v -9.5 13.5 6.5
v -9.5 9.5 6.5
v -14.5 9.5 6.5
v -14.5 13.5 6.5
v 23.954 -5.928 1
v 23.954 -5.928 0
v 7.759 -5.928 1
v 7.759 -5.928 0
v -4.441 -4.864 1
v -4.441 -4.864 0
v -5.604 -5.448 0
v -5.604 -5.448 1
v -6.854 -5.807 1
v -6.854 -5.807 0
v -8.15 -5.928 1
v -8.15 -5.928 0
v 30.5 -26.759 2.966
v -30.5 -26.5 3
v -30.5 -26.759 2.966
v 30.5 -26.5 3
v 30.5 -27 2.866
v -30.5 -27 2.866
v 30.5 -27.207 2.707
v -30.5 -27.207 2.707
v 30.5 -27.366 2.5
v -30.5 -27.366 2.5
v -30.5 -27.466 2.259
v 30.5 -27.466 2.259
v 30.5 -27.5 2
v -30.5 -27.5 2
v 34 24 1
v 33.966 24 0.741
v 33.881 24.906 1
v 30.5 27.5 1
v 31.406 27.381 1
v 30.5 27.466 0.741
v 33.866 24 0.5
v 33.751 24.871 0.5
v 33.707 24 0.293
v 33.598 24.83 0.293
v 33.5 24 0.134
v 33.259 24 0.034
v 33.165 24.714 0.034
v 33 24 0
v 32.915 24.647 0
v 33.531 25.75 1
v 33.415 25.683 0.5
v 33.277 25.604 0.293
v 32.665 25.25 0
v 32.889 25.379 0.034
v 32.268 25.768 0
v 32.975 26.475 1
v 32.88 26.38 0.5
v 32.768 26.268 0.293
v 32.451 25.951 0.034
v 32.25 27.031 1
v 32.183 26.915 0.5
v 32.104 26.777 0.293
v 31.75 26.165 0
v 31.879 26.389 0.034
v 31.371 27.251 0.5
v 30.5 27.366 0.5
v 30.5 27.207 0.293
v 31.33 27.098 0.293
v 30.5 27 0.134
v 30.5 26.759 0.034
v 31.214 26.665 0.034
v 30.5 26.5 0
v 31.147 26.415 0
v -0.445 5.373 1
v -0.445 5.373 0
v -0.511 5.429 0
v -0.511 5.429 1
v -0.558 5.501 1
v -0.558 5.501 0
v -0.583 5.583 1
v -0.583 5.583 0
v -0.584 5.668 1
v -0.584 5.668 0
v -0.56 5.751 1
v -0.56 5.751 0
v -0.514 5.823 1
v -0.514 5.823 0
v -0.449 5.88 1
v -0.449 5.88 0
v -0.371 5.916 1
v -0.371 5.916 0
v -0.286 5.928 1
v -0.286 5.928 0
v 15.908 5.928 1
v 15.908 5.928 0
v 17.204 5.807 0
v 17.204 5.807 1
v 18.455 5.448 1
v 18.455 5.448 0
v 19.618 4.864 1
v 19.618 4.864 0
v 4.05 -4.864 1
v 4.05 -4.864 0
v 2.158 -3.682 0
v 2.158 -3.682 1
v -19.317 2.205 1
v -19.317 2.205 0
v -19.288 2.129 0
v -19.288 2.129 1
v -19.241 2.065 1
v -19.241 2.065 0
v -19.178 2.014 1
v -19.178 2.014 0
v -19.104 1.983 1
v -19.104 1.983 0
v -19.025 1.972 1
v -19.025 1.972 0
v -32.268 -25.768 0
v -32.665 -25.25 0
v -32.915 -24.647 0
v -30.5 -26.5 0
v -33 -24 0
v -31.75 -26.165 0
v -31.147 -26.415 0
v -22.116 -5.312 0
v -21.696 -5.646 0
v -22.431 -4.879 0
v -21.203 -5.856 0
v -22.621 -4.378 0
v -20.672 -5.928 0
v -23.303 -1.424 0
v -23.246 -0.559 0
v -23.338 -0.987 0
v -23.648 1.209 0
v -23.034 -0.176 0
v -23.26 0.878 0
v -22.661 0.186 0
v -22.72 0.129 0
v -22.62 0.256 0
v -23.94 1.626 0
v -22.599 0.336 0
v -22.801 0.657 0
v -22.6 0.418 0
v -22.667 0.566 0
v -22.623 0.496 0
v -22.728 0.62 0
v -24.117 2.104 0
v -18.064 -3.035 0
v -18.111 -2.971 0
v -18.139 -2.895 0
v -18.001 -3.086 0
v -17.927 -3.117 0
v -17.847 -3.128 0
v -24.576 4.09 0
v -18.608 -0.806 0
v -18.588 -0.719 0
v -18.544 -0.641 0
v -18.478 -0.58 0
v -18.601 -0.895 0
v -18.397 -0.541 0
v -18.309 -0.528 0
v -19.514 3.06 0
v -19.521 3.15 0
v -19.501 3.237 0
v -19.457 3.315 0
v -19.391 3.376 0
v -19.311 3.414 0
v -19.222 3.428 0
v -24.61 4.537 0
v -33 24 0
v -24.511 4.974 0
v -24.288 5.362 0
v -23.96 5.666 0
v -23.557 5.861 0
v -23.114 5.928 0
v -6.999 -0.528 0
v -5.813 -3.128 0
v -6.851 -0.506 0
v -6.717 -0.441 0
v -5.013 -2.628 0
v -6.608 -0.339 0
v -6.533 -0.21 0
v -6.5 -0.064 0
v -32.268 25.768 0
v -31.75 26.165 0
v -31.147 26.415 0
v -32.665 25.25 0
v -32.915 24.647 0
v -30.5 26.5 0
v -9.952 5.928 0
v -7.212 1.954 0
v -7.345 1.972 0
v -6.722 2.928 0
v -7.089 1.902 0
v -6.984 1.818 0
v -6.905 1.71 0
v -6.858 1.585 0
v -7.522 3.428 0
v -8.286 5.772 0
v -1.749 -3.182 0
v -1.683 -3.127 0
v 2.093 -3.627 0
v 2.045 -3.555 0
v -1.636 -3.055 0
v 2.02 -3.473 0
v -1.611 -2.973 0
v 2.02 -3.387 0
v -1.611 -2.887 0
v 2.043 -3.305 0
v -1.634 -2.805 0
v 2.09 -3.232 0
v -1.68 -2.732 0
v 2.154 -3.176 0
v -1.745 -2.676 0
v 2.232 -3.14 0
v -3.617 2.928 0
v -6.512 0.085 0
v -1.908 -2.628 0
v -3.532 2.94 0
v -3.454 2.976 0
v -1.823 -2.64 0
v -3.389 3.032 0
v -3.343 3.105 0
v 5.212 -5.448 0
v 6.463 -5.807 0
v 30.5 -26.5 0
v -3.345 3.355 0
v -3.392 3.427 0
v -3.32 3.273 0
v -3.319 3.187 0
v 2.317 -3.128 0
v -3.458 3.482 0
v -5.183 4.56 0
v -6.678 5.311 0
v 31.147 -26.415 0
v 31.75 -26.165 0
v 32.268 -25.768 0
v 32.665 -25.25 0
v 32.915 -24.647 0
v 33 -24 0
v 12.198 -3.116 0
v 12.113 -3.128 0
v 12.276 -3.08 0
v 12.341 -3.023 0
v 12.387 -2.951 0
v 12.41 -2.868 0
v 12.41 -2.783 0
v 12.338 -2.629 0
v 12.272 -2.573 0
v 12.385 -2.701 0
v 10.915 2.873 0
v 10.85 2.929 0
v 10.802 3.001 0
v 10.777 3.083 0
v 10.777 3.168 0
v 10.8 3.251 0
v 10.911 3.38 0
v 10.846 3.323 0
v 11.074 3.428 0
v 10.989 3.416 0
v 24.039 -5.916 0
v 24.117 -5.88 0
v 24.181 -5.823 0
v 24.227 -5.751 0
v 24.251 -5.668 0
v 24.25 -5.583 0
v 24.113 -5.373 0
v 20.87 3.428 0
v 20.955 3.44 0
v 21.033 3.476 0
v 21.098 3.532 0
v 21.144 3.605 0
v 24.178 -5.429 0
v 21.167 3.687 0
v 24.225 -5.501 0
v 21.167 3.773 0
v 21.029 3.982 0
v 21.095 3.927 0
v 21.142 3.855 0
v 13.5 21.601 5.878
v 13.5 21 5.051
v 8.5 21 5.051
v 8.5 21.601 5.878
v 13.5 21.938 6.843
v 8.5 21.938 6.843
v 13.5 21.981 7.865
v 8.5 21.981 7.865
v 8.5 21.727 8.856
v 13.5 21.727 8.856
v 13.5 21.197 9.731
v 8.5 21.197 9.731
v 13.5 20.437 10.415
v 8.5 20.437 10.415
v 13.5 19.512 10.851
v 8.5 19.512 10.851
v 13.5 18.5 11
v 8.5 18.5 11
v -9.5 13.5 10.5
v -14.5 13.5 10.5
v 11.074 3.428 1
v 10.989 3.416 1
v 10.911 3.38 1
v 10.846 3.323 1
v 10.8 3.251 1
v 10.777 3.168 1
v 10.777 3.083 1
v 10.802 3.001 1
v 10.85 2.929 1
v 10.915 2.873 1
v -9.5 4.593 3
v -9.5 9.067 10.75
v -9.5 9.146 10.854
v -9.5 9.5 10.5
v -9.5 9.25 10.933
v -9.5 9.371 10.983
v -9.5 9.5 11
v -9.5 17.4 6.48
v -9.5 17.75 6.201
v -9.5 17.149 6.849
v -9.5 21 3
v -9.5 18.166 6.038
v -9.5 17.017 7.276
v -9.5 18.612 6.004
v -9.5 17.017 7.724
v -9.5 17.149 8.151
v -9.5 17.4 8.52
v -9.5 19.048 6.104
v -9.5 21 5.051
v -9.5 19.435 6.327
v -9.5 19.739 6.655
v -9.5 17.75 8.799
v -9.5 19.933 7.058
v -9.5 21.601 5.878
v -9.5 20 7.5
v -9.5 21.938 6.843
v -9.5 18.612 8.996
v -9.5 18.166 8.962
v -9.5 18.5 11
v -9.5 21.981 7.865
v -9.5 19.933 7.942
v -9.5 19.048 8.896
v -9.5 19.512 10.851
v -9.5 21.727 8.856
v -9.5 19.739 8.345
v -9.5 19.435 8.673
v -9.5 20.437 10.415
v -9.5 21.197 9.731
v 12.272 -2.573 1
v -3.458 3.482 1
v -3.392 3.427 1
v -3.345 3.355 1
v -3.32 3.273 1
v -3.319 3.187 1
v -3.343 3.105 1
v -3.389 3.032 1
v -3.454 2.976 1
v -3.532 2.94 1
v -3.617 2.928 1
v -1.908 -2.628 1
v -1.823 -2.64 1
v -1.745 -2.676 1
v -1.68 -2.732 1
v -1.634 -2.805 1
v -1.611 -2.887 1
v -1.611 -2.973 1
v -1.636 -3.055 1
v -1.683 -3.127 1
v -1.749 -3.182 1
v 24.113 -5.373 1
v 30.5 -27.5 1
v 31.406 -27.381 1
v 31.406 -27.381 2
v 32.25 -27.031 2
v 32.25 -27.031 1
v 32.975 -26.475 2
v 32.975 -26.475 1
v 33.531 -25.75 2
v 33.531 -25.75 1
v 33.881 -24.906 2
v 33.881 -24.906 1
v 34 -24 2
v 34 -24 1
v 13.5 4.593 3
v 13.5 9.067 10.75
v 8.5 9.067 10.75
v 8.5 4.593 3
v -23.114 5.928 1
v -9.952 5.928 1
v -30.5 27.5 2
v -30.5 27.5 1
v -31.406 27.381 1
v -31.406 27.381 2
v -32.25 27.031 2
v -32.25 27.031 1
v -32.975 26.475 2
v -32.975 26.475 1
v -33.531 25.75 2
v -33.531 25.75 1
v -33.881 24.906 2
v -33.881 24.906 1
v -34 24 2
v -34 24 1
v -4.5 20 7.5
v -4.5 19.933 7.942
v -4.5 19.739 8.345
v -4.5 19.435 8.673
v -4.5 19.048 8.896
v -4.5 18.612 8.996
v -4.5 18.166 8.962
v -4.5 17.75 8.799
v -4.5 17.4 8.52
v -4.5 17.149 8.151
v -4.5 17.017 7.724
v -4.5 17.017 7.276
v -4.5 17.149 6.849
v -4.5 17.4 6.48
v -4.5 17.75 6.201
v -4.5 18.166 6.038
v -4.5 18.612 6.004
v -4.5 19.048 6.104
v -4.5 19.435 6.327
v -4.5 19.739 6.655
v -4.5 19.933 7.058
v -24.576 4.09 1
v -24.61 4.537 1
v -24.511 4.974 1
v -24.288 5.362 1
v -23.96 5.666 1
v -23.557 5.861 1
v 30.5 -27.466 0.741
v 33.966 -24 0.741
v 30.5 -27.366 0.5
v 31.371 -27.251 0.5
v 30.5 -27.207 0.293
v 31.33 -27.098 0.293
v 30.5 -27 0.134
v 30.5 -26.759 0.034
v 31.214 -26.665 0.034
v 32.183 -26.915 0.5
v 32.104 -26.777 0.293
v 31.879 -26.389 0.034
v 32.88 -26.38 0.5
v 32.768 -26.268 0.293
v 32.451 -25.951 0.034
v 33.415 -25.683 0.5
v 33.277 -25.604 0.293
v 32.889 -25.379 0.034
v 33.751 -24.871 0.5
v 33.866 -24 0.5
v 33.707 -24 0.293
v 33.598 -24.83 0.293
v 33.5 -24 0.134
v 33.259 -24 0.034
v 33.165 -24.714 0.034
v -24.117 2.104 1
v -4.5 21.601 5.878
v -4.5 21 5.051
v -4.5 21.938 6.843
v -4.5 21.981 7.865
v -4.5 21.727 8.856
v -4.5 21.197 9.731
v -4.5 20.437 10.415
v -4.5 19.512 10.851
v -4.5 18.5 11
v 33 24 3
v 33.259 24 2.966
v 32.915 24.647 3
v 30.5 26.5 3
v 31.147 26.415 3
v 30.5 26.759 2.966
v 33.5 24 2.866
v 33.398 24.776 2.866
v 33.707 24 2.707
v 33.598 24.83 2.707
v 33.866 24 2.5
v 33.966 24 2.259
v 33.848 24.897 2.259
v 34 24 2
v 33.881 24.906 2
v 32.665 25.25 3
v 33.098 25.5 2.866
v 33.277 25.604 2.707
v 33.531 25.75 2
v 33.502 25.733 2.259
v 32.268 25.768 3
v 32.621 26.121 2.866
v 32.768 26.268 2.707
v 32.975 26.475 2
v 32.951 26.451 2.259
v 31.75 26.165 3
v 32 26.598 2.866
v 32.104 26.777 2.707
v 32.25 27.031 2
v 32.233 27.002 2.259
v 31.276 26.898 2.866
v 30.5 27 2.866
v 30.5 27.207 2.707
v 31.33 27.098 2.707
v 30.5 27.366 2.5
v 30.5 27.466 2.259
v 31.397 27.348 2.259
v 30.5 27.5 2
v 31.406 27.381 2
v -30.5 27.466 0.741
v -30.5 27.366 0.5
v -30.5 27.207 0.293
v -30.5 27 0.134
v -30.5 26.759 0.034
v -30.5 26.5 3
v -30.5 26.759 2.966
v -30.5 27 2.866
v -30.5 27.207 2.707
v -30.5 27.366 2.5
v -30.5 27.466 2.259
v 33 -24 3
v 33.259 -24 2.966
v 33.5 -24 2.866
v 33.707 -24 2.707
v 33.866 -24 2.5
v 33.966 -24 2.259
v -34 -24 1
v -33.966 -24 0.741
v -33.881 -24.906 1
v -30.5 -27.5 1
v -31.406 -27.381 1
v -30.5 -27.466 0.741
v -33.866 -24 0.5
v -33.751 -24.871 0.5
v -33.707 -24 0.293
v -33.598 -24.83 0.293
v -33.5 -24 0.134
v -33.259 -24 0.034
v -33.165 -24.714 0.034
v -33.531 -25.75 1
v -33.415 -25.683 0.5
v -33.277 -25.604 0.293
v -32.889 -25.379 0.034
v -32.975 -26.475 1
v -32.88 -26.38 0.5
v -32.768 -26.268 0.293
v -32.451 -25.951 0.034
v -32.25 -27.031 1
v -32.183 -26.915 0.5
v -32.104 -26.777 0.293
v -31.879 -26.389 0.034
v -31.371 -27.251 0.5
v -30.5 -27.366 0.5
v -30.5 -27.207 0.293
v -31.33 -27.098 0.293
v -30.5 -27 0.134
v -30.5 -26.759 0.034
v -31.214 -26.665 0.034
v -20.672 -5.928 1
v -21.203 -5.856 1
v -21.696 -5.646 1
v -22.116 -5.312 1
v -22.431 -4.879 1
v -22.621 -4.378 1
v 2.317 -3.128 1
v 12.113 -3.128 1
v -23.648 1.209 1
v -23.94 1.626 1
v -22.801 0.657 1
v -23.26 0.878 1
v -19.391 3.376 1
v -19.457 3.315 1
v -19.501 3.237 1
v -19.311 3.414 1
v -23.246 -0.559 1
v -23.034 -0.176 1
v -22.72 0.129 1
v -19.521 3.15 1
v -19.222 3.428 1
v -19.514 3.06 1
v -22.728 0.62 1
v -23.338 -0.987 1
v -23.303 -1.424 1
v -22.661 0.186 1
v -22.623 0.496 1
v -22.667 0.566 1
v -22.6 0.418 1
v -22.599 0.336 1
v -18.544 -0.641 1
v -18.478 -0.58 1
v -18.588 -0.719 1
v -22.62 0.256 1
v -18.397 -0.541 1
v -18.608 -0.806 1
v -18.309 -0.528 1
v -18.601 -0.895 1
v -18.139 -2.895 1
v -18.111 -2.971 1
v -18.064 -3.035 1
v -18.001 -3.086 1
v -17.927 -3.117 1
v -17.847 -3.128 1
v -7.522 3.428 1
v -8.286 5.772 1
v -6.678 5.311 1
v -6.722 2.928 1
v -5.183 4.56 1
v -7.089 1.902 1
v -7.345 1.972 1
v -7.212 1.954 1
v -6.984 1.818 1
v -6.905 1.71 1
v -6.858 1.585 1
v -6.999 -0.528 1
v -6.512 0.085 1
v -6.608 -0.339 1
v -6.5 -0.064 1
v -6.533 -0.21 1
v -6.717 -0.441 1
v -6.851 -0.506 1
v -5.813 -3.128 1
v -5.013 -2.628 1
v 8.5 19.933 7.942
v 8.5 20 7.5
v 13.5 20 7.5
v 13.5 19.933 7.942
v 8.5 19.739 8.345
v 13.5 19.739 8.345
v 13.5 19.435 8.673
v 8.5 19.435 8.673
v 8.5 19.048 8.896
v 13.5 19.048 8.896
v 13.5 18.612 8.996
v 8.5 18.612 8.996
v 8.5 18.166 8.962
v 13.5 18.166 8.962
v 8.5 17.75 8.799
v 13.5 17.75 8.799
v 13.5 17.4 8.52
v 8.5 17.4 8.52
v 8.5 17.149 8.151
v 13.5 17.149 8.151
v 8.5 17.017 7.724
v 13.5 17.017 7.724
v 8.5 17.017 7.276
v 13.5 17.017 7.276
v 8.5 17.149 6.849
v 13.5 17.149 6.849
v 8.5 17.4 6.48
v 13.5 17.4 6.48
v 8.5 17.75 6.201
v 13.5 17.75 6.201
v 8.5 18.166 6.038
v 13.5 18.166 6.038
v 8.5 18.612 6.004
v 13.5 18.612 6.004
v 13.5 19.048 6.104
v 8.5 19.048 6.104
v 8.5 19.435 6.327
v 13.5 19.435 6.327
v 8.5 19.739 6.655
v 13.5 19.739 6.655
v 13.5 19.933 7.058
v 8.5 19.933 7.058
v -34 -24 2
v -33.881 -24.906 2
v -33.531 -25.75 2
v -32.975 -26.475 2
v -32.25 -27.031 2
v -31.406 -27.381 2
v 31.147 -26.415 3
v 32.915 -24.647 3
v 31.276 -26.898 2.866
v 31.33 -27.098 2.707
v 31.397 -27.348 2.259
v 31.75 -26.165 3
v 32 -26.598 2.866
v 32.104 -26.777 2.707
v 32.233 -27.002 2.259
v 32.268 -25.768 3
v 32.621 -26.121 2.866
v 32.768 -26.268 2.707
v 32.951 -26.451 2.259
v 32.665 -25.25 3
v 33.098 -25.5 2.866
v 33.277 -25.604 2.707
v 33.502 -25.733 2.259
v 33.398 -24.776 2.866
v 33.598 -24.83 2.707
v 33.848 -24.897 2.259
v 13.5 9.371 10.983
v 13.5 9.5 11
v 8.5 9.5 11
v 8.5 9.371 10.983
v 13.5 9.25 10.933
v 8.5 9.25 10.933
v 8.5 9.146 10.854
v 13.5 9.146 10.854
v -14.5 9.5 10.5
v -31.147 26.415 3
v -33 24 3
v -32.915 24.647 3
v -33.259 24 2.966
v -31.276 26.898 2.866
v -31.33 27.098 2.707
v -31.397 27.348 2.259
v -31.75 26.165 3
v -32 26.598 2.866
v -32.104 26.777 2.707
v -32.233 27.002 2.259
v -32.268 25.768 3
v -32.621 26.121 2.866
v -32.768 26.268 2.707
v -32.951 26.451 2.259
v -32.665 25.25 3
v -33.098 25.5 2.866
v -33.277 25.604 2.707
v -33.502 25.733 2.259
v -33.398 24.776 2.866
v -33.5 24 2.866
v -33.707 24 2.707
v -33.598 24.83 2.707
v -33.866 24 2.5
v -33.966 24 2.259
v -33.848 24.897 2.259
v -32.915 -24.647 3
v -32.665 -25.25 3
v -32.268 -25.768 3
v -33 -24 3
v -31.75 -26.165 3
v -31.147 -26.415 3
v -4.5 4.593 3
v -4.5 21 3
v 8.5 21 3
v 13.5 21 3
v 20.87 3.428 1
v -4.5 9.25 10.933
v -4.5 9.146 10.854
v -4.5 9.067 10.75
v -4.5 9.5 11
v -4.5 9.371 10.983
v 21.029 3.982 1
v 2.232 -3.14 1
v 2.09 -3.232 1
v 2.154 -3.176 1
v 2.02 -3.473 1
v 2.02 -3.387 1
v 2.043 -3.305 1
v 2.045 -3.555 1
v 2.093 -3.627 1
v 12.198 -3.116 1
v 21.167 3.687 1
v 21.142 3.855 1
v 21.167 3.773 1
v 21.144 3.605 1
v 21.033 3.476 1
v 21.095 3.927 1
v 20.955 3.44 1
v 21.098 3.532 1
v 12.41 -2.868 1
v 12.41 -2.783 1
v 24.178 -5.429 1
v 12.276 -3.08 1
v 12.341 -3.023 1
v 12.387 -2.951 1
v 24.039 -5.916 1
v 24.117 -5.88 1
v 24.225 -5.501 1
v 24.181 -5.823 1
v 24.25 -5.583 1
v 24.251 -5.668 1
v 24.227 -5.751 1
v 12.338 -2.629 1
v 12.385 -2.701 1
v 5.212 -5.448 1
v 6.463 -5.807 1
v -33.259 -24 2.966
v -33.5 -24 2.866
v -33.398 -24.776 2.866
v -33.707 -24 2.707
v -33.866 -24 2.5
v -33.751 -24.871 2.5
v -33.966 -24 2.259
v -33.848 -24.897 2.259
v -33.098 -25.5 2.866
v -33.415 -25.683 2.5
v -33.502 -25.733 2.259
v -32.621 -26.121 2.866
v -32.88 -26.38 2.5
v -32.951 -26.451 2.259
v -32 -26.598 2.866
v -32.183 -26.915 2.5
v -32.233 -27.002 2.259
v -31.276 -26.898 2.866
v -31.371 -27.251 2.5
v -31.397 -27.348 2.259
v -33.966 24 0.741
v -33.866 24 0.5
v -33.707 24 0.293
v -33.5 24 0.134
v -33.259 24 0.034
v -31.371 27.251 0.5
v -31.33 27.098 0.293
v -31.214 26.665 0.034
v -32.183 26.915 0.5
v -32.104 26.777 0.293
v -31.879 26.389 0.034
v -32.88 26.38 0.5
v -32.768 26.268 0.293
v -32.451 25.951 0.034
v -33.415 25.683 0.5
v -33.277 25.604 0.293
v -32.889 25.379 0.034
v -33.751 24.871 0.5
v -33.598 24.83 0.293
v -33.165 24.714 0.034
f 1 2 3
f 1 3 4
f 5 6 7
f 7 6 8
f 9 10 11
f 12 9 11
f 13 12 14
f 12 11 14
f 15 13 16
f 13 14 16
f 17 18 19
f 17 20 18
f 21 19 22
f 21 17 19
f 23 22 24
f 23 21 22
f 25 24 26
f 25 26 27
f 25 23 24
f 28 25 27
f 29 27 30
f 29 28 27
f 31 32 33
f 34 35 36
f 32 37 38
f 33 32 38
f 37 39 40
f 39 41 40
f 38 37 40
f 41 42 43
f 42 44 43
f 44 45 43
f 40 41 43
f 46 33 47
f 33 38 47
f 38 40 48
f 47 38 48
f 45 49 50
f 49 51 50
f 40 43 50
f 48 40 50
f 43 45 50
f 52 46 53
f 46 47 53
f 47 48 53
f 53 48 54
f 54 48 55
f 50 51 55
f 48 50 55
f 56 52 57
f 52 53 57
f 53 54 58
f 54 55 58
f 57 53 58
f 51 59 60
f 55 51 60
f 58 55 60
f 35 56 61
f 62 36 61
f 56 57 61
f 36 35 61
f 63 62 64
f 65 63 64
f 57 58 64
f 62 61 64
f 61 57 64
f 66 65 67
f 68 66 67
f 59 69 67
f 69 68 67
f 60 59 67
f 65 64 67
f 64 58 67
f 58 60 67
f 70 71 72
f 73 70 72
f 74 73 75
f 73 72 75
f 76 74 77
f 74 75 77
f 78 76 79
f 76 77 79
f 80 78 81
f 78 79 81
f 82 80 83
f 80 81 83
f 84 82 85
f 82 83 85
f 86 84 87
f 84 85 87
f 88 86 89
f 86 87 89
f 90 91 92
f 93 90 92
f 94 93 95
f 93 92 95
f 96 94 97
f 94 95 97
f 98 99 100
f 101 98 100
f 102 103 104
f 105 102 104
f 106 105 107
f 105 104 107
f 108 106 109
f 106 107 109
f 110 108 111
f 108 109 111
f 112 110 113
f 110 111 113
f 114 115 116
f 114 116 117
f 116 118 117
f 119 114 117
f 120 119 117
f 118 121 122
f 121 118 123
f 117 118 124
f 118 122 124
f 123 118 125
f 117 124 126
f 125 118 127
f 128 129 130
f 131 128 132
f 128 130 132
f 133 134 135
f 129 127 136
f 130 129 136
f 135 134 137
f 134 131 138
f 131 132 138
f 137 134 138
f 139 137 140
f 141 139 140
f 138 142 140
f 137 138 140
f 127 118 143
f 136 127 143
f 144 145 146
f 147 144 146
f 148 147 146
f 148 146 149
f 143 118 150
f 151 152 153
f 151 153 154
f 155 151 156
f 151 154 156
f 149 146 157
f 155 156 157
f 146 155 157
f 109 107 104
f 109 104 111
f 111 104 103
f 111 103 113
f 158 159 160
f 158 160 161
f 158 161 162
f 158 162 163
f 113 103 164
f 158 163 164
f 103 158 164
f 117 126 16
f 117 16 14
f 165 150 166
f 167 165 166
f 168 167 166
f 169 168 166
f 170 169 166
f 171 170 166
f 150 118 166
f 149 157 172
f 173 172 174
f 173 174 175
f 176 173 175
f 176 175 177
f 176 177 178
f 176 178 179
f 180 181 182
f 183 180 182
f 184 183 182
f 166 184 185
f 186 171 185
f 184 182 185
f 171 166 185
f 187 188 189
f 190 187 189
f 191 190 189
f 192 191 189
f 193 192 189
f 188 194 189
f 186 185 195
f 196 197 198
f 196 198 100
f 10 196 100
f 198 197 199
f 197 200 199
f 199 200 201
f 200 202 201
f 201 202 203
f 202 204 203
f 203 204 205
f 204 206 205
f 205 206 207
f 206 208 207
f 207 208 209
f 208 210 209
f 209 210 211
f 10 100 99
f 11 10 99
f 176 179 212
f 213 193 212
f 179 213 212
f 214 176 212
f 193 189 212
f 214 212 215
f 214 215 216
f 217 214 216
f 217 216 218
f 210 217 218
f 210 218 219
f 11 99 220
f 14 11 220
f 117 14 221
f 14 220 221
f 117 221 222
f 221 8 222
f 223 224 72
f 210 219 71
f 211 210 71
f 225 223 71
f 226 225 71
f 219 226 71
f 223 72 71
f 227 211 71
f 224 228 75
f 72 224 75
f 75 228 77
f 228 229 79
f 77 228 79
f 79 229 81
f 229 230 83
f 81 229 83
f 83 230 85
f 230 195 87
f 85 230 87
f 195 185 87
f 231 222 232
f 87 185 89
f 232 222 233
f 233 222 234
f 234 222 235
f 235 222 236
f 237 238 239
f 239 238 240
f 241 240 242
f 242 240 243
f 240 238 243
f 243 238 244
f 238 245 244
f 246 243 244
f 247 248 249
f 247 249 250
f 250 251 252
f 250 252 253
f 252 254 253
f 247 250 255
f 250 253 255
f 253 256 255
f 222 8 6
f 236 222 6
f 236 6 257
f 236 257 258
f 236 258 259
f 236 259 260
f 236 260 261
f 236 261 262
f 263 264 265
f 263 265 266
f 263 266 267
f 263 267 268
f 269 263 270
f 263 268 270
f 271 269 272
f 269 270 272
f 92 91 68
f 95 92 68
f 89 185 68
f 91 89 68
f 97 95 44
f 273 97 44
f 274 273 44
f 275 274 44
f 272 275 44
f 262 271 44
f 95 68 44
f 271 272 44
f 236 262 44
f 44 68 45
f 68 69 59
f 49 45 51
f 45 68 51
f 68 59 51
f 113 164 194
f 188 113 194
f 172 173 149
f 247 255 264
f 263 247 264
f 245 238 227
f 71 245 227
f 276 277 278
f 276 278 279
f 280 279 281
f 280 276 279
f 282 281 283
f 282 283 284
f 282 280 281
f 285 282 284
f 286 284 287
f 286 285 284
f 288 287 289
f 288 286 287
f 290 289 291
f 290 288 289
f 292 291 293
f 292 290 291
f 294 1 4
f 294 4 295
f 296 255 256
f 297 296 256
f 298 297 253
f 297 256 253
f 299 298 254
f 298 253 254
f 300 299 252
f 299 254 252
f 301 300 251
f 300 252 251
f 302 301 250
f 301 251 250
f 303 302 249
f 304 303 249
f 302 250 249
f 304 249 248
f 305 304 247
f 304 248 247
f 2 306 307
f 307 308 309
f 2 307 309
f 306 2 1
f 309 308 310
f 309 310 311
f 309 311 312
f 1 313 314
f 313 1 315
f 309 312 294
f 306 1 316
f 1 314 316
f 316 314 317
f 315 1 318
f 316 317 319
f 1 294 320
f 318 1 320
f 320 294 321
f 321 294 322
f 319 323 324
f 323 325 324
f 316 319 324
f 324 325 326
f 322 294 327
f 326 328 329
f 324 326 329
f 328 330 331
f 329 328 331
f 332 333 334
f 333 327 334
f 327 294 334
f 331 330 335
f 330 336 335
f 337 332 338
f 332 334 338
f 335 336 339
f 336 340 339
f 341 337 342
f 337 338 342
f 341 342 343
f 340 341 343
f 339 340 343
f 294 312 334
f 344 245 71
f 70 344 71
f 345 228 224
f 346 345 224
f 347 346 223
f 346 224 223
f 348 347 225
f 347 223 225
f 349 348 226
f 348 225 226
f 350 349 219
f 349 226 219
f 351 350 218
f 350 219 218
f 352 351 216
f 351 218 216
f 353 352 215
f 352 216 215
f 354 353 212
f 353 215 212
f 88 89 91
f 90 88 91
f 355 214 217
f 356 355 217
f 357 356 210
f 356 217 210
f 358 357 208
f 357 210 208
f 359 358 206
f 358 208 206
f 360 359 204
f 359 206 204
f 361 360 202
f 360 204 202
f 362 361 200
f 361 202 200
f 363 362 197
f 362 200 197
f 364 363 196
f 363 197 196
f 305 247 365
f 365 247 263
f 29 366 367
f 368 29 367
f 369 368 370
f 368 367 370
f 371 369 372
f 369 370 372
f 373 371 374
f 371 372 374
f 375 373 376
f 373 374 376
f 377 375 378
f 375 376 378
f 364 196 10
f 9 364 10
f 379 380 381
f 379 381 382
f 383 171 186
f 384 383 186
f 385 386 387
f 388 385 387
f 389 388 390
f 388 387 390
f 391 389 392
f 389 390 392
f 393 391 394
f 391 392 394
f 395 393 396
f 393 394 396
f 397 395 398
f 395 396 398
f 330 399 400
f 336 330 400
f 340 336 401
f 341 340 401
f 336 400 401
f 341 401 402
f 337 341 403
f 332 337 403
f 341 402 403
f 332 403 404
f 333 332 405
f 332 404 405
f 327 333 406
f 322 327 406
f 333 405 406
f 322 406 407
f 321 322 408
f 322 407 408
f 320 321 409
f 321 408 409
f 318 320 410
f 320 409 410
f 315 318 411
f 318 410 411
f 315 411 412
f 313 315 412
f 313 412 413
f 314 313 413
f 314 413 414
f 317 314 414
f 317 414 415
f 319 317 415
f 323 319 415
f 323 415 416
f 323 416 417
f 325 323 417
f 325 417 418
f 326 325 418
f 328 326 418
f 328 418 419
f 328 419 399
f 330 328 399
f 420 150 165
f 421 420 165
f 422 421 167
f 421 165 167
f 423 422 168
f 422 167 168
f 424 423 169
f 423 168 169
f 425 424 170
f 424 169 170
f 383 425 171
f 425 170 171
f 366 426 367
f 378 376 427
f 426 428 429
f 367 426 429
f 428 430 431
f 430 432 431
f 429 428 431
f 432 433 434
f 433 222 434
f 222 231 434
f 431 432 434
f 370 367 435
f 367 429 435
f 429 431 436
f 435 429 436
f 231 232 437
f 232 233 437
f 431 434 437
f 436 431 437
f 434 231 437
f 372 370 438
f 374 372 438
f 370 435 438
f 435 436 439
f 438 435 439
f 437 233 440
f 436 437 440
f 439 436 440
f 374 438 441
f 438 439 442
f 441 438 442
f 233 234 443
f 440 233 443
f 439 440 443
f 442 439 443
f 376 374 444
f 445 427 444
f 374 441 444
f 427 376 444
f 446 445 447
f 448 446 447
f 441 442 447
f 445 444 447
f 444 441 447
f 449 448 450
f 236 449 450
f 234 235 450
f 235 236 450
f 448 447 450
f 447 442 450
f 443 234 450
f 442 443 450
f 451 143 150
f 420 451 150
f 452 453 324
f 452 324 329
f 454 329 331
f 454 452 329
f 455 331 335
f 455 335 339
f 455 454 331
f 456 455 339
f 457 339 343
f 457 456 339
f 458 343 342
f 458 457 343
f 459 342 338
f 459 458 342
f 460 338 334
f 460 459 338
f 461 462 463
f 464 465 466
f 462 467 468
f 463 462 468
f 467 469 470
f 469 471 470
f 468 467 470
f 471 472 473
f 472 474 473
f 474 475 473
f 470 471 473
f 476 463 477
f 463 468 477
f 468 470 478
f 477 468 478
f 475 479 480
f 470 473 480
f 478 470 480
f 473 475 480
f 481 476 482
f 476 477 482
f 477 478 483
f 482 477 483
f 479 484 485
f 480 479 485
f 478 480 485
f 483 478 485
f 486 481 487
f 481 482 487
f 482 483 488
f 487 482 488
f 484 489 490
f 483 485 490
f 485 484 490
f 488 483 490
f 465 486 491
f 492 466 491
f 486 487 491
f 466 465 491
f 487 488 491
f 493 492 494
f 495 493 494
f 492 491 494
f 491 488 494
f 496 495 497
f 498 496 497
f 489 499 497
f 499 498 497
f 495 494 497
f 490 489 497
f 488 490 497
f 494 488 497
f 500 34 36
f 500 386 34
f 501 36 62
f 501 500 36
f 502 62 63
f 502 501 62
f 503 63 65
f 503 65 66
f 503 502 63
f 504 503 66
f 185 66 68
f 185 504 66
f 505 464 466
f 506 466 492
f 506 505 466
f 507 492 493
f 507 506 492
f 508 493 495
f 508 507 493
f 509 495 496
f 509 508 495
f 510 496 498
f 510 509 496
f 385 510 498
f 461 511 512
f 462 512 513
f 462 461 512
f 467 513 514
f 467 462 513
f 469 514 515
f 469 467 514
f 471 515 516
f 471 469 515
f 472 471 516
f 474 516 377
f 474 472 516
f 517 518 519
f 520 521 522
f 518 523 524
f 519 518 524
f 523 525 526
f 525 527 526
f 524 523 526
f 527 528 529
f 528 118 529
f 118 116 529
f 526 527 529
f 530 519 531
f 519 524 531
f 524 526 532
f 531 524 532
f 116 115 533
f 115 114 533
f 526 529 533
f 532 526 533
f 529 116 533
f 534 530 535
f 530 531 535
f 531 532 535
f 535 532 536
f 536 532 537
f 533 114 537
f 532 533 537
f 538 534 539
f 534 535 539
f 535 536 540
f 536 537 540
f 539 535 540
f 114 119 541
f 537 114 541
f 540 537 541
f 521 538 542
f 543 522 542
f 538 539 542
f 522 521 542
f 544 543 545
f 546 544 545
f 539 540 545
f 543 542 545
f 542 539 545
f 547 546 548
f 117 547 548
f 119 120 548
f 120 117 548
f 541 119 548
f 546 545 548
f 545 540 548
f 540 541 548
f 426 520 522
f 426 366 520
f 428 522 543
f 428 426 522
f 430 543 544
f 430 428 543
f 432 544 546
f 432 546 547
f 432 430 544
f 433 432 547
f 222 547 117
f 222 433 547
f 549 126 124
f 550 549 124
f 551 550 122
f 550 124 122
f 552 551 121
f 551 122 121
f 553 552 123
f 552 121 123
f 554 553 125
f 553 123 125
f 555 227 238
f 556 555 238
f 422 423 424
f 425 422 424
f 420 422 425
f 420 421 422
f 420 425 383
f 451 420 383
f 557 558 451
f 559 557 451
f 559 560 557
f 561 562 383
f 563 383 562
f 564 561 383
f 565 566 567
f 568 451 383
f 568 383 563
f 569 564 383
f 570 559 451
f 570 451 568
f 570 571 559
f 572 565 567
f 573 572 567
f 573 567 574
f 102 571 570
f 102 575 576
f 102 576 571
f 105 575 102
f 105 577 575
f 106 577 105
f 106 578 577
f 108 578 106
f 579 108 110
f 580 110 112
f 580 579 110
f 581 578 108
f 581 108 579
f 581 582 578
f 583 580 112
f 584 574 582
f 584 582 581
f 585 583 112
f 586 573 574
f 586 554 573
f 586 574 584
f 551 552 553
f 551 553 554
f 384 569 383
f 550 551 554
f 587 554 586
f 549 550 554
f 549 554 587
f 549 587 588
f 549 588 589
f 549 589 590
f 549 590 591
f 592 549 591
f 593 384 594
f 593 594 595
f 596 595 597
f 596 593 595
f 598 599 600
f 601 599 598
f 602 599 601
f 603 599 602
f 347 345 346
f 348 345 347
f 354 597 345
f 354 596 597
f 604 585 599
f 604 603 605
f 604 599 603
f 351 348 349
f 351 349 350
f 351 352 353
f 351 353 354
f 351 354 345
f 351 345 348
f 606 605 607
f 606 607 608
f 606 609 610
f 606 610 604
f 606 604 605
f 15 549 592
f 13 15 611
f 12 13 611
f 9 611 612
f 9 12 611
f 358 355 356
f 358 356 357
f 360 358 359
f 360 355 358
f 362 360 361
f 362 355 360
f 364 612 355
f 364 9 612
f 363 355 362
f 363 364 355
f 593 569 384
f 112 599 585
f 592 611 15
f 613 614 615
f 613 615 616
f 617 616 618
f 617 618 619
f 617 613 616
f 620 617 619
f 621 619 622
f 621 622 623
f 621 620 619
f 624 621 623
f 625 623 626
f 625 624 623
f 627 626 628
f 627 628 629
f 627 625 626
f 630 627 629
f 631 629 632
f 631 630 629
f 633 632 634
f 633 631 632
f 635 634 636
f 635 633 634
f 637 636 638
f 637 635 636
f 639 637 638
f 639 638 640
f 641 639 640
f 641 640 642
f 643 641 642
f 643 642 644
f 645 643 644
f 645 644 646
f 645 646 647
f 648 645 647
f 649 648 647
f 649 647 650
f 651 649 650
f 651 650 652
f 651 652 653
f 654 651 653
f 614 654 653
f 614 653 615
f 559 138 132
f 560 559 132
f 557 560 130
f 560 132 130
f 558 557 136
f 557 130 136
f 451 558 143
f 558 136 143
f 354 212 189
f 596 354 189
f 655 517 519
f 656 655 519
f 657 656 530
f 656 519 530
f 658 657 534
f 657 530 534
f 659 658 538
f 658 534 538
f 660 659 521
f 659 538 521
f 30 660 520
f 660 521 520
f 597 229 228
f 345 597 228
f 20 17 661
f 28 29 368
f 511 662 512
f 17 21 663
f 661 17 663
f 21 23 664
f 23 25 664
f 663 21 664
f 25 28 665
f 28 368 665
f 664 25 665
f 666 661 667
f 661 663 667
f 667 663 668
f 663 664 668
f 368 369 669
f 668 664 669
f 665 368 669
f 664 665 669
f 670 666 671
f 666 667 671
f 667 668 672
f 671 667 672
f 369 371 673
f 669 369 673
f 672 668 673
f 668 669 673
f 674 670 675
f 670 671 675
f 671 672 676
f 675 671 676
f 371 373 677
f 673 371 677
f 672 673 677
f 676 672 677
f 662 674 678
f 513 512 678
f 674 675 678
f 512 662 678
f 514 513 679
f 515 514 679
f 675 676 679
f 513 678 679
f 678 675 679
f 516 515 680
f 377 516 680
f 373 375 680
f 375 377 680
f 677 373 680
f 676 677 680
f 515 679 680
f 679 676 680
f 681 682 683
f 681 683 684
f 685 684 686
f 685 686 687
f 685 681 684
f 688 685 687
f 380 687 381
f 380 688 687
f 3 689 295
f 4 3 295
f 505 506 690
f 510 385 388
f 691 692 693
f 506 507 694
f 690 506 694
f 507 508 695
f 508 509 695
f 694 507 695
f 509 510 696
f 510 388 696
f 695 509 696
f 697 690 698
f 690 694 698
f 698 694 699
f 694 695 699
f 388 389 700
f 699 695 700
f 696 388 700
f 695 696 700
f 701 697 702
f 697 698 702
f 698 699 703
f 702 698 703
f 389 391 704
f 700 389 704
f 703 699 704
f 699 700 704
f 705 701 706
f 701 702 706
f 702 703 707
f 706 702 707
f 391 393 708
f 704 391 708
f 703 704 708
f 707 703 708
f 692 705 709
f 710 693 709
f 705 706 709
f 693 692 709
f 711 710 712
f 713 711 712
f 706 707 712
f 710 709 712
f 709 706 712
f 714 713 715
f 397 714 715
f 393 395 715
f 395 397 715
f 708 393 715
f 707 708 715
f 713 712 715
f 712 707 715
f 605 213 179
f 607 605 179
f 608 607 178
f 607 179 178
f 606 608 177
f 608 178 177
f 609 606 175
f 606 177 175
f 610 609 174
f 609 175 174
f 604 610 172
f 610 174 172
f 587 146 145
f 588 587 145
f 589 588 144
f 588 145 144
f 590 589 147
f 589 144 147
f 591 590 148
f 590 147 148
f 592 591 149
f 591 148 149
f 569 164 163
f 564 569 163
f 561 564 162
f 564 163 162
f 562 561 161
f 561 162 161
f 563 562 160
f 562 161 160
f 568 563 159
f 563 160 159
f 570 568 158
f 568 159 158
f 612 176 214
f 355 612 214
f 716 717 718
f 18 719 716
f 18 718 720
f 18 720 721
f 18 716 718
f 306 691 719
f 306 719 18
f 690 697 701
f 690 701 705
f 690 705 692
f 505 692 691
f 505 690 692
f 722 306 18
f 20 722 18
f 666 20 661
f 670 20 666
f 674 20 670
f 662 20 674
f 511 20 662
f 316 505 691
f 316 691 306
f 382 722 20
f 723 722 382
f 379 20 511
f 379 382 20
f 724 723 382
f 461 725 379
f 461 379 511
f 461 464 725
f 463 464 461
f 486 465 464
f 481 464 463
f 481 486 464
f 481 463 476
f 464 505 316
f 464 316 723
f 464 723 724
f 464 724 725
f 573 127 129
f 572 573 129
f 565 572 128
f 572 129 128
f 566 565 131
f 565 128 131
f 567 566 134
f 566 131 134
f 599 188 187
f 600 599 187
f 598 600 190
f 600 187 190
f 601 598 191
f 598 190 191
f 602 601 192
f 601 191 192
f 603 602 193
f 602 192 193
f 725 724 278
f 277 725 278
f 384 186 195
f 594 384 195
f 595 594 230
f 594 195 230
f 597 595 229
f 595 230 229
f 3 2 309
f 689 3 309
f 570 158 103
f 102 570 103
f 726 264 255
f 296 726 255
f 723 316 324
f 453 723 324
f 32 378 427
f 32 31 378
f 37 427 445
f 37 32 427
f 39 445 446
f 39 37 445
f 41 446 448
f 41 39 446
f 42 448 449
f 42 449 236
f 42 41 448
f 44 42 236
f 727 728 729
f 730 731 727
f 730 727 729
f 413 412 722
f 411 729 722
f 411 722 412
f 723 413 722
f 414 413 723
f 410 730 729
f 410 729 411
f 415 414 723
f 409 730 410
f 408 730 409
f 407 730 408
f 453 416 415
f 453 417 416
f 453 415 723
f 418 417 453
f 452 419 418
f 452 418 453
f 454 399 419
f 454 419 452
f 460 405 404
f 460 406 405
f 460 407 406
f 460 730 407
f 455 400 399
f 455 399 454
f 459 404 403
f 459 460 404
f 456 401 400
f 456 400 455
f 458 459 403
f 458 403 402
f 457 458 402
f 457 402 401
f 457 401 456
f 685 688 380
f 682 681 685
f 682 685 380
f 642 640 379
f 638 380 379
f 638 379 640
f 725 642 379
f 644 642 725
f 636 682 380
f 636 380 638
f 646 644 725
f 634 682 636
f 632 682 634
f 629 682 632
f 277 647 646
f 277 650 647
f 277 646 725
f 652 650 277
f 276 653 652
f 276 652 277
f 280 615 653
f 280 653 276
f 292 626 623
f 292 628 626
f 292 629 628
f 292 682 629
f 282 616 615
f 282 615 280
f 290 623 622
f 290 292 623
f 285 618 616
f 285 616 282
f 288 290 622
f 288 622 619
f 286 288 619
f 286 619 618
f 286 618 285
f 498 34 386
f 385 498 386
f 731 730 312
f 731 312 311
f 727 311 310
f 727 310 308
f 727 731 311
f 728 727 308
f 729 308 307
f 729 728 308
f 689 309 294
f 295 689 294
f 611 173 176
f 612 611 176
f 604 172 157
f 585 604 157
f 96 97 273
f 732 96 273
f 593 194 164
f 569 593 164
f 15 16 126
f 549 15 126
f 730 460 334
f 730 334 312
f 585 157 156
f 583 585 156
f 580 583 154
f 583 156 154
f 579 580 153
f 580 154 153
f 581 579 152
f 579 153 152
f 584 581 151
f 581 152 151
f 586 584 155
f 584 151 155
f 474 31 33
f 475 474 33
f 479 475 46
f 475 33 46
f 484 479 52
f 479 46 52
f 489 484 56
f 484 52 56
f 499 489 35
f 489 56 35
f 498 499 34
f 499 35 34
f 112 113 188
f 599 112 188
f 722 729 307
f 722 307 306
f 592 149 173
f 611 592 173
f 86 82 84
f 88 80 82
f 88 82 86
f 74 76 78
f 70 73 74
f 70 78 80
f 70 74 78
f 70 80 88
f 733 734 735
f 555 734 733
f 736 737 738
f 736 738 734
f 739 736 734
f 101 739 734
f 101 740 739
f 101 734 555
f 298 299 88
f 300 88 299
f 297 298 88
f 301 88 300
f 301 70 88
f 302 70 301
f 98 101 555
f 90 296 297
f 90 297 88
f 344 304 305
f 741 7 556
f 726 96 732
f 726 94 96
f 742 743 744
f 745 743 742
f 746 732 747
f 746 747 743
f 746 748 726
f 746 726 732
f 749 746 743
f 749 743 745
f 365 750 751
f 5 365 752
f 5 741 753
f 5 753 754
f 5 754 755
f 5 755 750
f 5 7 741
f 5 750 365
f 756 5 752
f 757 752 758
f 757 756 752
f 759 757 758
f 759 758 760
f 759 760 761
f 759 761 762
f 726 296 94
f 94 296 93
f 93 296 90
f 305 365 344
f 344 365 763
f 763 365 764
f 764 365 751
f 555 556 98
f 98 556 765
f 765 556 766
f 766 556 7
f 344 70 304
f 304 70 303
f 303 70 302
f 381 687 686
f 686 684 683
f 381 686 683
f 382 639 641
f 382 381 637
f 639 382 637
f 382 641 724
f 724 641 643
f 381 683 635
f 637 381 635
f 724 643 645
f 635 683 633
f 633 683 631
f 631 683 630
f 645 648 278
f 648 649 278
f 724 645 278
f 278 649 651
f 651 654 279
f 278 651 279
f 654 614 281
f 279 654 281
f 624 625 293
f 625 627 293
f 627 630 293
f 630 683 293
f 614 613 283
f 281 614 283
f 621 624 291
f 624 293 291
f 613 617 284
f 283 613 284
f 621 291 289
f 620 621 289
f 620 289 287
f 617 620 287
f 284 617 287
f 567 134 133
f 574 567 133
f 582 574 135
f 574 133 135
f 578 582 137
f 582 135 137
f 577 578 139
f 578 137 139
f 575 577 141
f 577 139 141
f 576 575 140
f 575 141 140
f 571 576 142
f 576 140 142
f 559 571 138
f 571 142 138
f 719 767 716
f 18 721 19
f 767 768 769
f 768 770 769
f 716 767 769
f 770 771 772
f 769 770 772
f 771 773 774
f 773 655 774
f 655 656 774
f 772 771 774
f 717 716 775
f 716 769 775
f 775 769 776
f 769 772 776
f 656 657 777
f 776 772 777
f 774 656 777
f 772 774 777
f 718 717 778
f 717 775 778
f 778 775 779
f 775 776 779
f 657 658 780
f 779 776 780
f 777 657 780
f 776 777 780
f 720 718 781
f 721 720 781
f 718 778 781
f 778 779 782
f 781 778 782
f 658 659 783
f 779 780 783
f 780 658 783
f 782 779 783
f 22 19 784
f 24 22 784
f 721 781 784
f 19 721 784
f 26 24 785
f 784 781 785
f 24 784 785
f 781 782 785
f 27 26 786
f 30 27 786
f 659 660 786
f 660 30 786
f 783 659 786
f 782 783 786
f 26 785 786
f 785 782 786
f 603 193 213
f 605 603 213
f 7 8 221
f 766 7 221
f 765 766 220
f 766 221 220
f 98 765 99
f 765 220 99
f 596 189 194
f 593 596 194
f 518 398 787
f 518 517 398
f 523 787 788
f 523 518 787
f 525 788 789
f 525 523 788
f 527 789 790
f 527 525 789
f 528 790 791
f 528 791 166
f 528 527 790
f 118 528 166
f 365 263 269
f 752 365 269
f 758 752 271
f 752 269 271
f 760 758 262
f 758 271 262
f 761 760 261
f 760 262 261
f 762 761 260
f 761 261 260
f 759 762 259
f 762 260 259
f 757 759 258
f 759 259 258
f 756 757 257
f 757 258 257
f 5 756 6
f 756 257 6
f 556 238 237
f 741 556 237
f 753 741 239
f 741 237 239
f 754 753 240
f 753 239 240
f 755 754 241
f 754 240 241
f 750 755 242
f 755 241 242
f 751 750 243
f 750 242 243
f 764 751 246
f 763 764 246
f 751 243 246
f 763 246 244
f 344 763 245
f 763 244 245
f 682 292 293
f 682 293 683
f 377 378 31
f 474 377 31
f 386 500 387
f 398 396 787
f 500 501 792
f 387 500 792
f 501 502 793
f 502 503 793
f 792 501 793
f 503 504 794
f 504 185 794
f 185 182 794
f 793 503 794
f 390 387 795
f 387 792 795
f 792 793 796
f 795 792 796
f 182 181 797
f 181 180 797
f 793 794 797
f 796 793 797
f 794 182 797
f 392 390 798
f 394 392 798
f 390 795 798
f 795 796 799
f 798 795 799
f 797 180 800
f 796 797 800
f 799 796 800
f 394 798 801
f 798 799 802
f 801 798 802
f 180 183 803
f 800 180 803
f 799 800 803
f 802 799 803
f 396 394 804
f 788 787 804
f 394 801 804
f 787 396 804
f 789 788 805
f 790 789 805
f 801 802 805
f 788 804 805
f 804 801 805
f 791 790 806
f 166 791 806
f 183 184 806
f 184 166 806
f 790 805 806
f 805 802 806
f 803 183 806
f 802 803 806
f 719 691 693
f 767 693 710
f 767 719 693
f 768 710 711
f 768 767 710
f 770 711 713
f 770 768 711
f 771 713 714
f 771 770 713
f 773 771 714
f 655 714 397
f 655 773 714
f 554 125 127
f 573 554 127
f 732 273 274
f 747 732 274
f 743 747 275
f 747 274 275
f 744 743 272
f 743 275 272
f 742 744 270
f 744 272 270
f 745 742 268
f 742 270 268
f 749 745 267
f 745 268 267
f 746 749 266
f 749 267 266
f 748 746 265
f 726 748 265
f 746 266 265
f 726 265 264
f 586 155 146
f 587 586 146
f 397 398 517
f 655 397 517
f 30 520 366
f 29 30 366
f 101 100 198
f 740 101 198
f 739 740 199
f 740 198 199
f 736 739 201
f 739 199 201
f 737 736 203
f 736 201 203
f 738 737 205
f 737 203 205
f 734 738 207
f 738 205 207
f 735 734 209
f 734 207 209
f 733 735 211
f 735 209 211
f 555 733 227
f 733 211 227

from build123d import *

# Parameters (mm, degrees)
F1_DEPTH      = 3
F2_R          = 1.5
F2_W          = 4
F2_H          = 4
F3_DEPTH      = 13.5
F3_DEPTH_BACK = 9.5
F4_DEPTH      = 14.5
F5_DEPTH      = 8.5
F5_DEPTH_BACK = 4.5
F6_R          = 1
F9_DEPTH      = 1


with BuildPart() as f1:
    # F0 (on Top) → F1 (new body)
    with BuildSketch(Plane.XY):
        with BuildLine():
            Line((30.5, 27.5), (-30.5, 27.5))
            ThreePointArc((-30.5, 27.5), (-32.9748737342, 26.4748737342), (-34, 24))
            Line((-34, 24), (-34, -24))
            ThreePointArc((-34, -24), (-32.9748737342, -26.4748737342), (-30.5, -27.5))
            Line((-30.5, -27.5), (30.5, -27.5))
            ThreePointArc((30.5, -27.5), (32.9748737342, -26.4748737342), (34, -24))
            Line((34, -24), (34, 24))
            ThreePointArc((34, 24), (32.9748737342, 26.4748737342), (30.5, 27.5))
        make_face()
    extrude(amount=F1_DEPTH)

    # F2 (on Right) → F3 (join, two sides)
    with BuildSketch(Plane.YZ) as f3_sk:
        with BuildLine():
            Line((9.0669872981, 10.75), (4.5925227119, 3))
            Line((4.5925227119, 3), (21, 3))
            Line((21, 3), (21, 5.0505102572))
            ThreePointArc((21, 5.0505102572), (21.7267021942, 8.8558735008), (18.5, 11))
            Line((18.5, 11), (9.5, 11))
            ThreePointArc((9.5, 11), (9.25, 10.9330127019), (9.0669872981, 10.75))
        make_face()
        with Locations((18.5, 7.5)):
            Circle(F2_R, mode=Mode.SUBTRACT)
        with Locations((11.5, 8.5)):
            Rectangle(F2_W, F2_H, mode=Mode.SUBTRACT)
        with Locations((11.5, 8.5)):
            Rectangle(F2_W, F2_H)
    extrude(amount=F3_DEPTH)
    extrude(f3_sk.sketch, amount=-F3_DEPTH_BACK)

    # F2 (on Right) → F4 (join, through all)
    with BuildSketch(Plane.YZ):
        with Locations((11.5, 8.5)):
            Rectangle(F2_W, F2_H)
    extrude(amount=-F4_DEPTH)

    # F2 (on Right) → F5 (cut, two sides)
    with BuildSketch(Plane.YZ) as f5_sk:
        with BuildLine():
            Line((9.0669872981, 10.75), (4.5925227119, 3))
            Line((4.5925227119, 3), (21, 3))
            Line((21, 3), (21, 5.0505102572))
            ThreePointArc((21, 5.0505102572), (21.7267021942, 8.8558735008), (18.5, 11))
            Line((18.5, 11), (9.5, 11))
            ThreePointArc((9.5, 11), (9.25, 10.9330127019), (9.0669872981, 10.75))
        make_face()
        with Locations((18.5, 7.5)):
            Circle(F2_R, mode=Mode.SUBTRACT)
        with Locations((11.5, 8.5)):
            Rectangle(F2_W, F2_H, mode=Mode.SUBTRACT)
        with Locations((11.5, 8.5)):
            Rectangle(F2_W, F2_H)
    extrude(amount=F5_DEPTH, mode=Mode.SUBTRACT)
    extrude(f5_sk.sketch, amount=-F5_DEPTH_BACK, mode=Mode.SUBTRACT)

    # F6
    f6_edges = [f1.edges().sort_by_distance(p)[0] for p in [
        (0, -27.5, 0),
        (0, -27.5, 3),
    ]]
    fillet(f6_edges, radius=F6_R)

    # F8 (on face) → F9 (cut)
    with BuildSketch(Plane(origin=(0, 0, 0), x_dir=(1, 0, 0), z_dir=(0, 0, -1))):
        with BuildLine():
            Line((19.6177823817, -4.8641717246), (21.0291530011, -3.9822494804))
            ThreePointArc((21.0291530011, -3.9822494804), (21.1585557306, -3.6451438448), (20.8701772218, -3.4278350515))
            Line((20.8701772218, -3.4278350515), (11.0740224249, -3.4278350515))
            ThreePointArc((11.0740224249, -3.4278350515), (10.7856439161, -3.2105262583), (10.9150466456, -2.8734206227))
            Line((10.9150466456, -2.8734206227), (24.1127514461, 5.3734206227))
            ThreePointArc((24.1127514461, 5.3734206227), (24.2421541756, 5.7105262583), (23.9537756668, 5.9278350515))
            Line((23.9537756668, 5.9278350515), (7.7590025694, 5.9278350515))
            ThreePointArc((7.7590025694, 5.9278350515), (5.8295410786, 5.6566669231), (4.0495677197, 4.8641717246))
            Line((4.0495677197, 4.8641717246), (2.1580967416, 3.6822494804))
            ThreePointArc((2.1580967416, 3.6822494804), (2.0286940121, 3.3451438448), (2.3170725209, 3.1278350515))
            Line((2.3170725209, 3.1278350515), (12.1132273178, 3.1278350515))
            ThreePointArc((12.1132273178, 3.1278350515), (12.4016058266, 2.9105262583), (12.2722030971, 2.5734206227))
            Line((12.2722030971, 2.5734206227), (-0.4454013447, -5.3734206227))
            ThreePointArc((-0.4454013447, -5.3734206227), (-0.5748040742, -5.7105262583), (-0.2864255655, -5.9278350515))
            Line((-0.2864255655, -5.9278350515), (15.908347532, -5.9278350515))
            ThreePointArc((15.908347532, -5.9278350515), (17.8378090227, -5.6566669231), (19.6177823817, -4.8641717246))
        make_face()
        with BuildLine():
            Line((-5.1827407197, -4.560267917), (-3.4575505927, -3.4822494804))
            ThreePointArc((-3.4575505927, -3.4822494804), (-3.3281478632, -3.1451438448), (-3.616526372, -2.9278350515))
            Line((-3.616526372, -2.9278350515), (-6.7218778514, -2.9278350515))
            Line((-6.7218778514, -2.9278350515), (-7.5220451159, -3.4278350515))
            Line((-7.5220451159, -3.4278350515), (-19.2220485259, -3.4278350515))
            ThreePointArc((-19.2220485259, -3.4278350515), (-19.4568309729, -3.3145894425), (-19.5143595453, -3.0603497352))
            Line((-19.5143595453, -3.0603497352), (-19.3168125364, -2.2046796322))
            ThreePointArc((-19.3168125364, -2.2046796322), (-19.211255908, -2.0373825014), (-19.024501517, -1.9721649485))
            Line((-19.024501517, -1.9721649485), (-7.3452009568, -1.9721649485))
            ThreePointArc((-7.3452009568, -1.9721649485), (-7.0339436385, -1.8634690269), (-6.8580159244, -1.5846404756))
            Line((-6.8580159244, -1.5846404756), (-6.5117136377, -0.0846404756))
            ThreePointArc((-6.5117136377, -0.0846404756), (-6.6075945917, 0.3390923699), (-6.9988986701, 0.5278350515))
            Line((-6.9988986701, 0.5278350515), (-18.3088101245, 0.5278350515))
            ThreePointArc((-18.3088101245, 0.5278350515), (-18.5435925715, 0.6410806606), (-18.6011211439, 0.8953203678))
            Line((-18.6011211439, 0.8953203678), (-18.1393847617, 2.8953203678))
            ThreePointArc((-18.1393847617, 2.8953203678), (-18.0338281332, 3.0626174986), (-17.8470737422, 3.1278350515))
            Line((-17.8470737422, 3.1278350515), (-5.8134825092, 3.1278350515))
            Line((-5.8134825092, 3.1278350515), (-5.0133152446, 2.6278350515))
            Line((-5.0133152446, 2.6278350515), (-1.9079637652, 2.6278350515))
            ThreePointArc((-1.9079637652, 2.6278350515), (-1.6195852564, 2.8451438448), (-1.748987986, 3.1822494804))
            Line((-1.748987986, 3.1822494804), (-4.4406262286, 4.8641717246))
            ThreePointArc((-4.4406262286, 4.8641717246), (-6.2205995875, 5.6566669231), (-8.1500610782, 5.9278350515))
            Line((-8.1500610782, 5.9278350515), (-20.6720310554, 5.9278350515))
            ThreePointArc((-20.6720310554, 5.9278350515), (-21.9170603287, 5.4930513653), (-22.620771185, 4.3777371602))
            Line((-22.620771185, 4.3777371602), (-23.3027861367, 1.4236058509))
            ThreePointArc((-23.3027861367, 1.4236058509), (-23.2457131813, 0.5594631094), (-22.7204795121, -0.1291075788))
            ThreePointArc((-22.7204795121, -0.1291075788), (-22.5997954695, -0.4176373884), (-22.8013911757, -0.6567466947))
            ThreePointArc((-22.8013911757, -0.6567466947), (-23.6483083742, -1.208565733), (-24.1172110997, -2.1040562277))
            Line((-24.1172110997, -2.1040562277), (-24.5757966488, -4.09040847))
            ThreePointArc((-24.5757966488, -4.09040847), (-24.2881537869, -5.3616070065), (-23.1142415516, -5.9278350515))
            Line((-23.1142415516, -5.9278350515), (-9.9520140978, -5.9278350515))
            ThreePointArc((-9.9520140978, -5.9278350515), (-7.4712778955, -5.579190315), (-5.1827407197, -4.560267917))
        make_face()
    extrude(amount=-F9_DEPTH, mode=Mode.SUBTRACT)


solid = f1.part
